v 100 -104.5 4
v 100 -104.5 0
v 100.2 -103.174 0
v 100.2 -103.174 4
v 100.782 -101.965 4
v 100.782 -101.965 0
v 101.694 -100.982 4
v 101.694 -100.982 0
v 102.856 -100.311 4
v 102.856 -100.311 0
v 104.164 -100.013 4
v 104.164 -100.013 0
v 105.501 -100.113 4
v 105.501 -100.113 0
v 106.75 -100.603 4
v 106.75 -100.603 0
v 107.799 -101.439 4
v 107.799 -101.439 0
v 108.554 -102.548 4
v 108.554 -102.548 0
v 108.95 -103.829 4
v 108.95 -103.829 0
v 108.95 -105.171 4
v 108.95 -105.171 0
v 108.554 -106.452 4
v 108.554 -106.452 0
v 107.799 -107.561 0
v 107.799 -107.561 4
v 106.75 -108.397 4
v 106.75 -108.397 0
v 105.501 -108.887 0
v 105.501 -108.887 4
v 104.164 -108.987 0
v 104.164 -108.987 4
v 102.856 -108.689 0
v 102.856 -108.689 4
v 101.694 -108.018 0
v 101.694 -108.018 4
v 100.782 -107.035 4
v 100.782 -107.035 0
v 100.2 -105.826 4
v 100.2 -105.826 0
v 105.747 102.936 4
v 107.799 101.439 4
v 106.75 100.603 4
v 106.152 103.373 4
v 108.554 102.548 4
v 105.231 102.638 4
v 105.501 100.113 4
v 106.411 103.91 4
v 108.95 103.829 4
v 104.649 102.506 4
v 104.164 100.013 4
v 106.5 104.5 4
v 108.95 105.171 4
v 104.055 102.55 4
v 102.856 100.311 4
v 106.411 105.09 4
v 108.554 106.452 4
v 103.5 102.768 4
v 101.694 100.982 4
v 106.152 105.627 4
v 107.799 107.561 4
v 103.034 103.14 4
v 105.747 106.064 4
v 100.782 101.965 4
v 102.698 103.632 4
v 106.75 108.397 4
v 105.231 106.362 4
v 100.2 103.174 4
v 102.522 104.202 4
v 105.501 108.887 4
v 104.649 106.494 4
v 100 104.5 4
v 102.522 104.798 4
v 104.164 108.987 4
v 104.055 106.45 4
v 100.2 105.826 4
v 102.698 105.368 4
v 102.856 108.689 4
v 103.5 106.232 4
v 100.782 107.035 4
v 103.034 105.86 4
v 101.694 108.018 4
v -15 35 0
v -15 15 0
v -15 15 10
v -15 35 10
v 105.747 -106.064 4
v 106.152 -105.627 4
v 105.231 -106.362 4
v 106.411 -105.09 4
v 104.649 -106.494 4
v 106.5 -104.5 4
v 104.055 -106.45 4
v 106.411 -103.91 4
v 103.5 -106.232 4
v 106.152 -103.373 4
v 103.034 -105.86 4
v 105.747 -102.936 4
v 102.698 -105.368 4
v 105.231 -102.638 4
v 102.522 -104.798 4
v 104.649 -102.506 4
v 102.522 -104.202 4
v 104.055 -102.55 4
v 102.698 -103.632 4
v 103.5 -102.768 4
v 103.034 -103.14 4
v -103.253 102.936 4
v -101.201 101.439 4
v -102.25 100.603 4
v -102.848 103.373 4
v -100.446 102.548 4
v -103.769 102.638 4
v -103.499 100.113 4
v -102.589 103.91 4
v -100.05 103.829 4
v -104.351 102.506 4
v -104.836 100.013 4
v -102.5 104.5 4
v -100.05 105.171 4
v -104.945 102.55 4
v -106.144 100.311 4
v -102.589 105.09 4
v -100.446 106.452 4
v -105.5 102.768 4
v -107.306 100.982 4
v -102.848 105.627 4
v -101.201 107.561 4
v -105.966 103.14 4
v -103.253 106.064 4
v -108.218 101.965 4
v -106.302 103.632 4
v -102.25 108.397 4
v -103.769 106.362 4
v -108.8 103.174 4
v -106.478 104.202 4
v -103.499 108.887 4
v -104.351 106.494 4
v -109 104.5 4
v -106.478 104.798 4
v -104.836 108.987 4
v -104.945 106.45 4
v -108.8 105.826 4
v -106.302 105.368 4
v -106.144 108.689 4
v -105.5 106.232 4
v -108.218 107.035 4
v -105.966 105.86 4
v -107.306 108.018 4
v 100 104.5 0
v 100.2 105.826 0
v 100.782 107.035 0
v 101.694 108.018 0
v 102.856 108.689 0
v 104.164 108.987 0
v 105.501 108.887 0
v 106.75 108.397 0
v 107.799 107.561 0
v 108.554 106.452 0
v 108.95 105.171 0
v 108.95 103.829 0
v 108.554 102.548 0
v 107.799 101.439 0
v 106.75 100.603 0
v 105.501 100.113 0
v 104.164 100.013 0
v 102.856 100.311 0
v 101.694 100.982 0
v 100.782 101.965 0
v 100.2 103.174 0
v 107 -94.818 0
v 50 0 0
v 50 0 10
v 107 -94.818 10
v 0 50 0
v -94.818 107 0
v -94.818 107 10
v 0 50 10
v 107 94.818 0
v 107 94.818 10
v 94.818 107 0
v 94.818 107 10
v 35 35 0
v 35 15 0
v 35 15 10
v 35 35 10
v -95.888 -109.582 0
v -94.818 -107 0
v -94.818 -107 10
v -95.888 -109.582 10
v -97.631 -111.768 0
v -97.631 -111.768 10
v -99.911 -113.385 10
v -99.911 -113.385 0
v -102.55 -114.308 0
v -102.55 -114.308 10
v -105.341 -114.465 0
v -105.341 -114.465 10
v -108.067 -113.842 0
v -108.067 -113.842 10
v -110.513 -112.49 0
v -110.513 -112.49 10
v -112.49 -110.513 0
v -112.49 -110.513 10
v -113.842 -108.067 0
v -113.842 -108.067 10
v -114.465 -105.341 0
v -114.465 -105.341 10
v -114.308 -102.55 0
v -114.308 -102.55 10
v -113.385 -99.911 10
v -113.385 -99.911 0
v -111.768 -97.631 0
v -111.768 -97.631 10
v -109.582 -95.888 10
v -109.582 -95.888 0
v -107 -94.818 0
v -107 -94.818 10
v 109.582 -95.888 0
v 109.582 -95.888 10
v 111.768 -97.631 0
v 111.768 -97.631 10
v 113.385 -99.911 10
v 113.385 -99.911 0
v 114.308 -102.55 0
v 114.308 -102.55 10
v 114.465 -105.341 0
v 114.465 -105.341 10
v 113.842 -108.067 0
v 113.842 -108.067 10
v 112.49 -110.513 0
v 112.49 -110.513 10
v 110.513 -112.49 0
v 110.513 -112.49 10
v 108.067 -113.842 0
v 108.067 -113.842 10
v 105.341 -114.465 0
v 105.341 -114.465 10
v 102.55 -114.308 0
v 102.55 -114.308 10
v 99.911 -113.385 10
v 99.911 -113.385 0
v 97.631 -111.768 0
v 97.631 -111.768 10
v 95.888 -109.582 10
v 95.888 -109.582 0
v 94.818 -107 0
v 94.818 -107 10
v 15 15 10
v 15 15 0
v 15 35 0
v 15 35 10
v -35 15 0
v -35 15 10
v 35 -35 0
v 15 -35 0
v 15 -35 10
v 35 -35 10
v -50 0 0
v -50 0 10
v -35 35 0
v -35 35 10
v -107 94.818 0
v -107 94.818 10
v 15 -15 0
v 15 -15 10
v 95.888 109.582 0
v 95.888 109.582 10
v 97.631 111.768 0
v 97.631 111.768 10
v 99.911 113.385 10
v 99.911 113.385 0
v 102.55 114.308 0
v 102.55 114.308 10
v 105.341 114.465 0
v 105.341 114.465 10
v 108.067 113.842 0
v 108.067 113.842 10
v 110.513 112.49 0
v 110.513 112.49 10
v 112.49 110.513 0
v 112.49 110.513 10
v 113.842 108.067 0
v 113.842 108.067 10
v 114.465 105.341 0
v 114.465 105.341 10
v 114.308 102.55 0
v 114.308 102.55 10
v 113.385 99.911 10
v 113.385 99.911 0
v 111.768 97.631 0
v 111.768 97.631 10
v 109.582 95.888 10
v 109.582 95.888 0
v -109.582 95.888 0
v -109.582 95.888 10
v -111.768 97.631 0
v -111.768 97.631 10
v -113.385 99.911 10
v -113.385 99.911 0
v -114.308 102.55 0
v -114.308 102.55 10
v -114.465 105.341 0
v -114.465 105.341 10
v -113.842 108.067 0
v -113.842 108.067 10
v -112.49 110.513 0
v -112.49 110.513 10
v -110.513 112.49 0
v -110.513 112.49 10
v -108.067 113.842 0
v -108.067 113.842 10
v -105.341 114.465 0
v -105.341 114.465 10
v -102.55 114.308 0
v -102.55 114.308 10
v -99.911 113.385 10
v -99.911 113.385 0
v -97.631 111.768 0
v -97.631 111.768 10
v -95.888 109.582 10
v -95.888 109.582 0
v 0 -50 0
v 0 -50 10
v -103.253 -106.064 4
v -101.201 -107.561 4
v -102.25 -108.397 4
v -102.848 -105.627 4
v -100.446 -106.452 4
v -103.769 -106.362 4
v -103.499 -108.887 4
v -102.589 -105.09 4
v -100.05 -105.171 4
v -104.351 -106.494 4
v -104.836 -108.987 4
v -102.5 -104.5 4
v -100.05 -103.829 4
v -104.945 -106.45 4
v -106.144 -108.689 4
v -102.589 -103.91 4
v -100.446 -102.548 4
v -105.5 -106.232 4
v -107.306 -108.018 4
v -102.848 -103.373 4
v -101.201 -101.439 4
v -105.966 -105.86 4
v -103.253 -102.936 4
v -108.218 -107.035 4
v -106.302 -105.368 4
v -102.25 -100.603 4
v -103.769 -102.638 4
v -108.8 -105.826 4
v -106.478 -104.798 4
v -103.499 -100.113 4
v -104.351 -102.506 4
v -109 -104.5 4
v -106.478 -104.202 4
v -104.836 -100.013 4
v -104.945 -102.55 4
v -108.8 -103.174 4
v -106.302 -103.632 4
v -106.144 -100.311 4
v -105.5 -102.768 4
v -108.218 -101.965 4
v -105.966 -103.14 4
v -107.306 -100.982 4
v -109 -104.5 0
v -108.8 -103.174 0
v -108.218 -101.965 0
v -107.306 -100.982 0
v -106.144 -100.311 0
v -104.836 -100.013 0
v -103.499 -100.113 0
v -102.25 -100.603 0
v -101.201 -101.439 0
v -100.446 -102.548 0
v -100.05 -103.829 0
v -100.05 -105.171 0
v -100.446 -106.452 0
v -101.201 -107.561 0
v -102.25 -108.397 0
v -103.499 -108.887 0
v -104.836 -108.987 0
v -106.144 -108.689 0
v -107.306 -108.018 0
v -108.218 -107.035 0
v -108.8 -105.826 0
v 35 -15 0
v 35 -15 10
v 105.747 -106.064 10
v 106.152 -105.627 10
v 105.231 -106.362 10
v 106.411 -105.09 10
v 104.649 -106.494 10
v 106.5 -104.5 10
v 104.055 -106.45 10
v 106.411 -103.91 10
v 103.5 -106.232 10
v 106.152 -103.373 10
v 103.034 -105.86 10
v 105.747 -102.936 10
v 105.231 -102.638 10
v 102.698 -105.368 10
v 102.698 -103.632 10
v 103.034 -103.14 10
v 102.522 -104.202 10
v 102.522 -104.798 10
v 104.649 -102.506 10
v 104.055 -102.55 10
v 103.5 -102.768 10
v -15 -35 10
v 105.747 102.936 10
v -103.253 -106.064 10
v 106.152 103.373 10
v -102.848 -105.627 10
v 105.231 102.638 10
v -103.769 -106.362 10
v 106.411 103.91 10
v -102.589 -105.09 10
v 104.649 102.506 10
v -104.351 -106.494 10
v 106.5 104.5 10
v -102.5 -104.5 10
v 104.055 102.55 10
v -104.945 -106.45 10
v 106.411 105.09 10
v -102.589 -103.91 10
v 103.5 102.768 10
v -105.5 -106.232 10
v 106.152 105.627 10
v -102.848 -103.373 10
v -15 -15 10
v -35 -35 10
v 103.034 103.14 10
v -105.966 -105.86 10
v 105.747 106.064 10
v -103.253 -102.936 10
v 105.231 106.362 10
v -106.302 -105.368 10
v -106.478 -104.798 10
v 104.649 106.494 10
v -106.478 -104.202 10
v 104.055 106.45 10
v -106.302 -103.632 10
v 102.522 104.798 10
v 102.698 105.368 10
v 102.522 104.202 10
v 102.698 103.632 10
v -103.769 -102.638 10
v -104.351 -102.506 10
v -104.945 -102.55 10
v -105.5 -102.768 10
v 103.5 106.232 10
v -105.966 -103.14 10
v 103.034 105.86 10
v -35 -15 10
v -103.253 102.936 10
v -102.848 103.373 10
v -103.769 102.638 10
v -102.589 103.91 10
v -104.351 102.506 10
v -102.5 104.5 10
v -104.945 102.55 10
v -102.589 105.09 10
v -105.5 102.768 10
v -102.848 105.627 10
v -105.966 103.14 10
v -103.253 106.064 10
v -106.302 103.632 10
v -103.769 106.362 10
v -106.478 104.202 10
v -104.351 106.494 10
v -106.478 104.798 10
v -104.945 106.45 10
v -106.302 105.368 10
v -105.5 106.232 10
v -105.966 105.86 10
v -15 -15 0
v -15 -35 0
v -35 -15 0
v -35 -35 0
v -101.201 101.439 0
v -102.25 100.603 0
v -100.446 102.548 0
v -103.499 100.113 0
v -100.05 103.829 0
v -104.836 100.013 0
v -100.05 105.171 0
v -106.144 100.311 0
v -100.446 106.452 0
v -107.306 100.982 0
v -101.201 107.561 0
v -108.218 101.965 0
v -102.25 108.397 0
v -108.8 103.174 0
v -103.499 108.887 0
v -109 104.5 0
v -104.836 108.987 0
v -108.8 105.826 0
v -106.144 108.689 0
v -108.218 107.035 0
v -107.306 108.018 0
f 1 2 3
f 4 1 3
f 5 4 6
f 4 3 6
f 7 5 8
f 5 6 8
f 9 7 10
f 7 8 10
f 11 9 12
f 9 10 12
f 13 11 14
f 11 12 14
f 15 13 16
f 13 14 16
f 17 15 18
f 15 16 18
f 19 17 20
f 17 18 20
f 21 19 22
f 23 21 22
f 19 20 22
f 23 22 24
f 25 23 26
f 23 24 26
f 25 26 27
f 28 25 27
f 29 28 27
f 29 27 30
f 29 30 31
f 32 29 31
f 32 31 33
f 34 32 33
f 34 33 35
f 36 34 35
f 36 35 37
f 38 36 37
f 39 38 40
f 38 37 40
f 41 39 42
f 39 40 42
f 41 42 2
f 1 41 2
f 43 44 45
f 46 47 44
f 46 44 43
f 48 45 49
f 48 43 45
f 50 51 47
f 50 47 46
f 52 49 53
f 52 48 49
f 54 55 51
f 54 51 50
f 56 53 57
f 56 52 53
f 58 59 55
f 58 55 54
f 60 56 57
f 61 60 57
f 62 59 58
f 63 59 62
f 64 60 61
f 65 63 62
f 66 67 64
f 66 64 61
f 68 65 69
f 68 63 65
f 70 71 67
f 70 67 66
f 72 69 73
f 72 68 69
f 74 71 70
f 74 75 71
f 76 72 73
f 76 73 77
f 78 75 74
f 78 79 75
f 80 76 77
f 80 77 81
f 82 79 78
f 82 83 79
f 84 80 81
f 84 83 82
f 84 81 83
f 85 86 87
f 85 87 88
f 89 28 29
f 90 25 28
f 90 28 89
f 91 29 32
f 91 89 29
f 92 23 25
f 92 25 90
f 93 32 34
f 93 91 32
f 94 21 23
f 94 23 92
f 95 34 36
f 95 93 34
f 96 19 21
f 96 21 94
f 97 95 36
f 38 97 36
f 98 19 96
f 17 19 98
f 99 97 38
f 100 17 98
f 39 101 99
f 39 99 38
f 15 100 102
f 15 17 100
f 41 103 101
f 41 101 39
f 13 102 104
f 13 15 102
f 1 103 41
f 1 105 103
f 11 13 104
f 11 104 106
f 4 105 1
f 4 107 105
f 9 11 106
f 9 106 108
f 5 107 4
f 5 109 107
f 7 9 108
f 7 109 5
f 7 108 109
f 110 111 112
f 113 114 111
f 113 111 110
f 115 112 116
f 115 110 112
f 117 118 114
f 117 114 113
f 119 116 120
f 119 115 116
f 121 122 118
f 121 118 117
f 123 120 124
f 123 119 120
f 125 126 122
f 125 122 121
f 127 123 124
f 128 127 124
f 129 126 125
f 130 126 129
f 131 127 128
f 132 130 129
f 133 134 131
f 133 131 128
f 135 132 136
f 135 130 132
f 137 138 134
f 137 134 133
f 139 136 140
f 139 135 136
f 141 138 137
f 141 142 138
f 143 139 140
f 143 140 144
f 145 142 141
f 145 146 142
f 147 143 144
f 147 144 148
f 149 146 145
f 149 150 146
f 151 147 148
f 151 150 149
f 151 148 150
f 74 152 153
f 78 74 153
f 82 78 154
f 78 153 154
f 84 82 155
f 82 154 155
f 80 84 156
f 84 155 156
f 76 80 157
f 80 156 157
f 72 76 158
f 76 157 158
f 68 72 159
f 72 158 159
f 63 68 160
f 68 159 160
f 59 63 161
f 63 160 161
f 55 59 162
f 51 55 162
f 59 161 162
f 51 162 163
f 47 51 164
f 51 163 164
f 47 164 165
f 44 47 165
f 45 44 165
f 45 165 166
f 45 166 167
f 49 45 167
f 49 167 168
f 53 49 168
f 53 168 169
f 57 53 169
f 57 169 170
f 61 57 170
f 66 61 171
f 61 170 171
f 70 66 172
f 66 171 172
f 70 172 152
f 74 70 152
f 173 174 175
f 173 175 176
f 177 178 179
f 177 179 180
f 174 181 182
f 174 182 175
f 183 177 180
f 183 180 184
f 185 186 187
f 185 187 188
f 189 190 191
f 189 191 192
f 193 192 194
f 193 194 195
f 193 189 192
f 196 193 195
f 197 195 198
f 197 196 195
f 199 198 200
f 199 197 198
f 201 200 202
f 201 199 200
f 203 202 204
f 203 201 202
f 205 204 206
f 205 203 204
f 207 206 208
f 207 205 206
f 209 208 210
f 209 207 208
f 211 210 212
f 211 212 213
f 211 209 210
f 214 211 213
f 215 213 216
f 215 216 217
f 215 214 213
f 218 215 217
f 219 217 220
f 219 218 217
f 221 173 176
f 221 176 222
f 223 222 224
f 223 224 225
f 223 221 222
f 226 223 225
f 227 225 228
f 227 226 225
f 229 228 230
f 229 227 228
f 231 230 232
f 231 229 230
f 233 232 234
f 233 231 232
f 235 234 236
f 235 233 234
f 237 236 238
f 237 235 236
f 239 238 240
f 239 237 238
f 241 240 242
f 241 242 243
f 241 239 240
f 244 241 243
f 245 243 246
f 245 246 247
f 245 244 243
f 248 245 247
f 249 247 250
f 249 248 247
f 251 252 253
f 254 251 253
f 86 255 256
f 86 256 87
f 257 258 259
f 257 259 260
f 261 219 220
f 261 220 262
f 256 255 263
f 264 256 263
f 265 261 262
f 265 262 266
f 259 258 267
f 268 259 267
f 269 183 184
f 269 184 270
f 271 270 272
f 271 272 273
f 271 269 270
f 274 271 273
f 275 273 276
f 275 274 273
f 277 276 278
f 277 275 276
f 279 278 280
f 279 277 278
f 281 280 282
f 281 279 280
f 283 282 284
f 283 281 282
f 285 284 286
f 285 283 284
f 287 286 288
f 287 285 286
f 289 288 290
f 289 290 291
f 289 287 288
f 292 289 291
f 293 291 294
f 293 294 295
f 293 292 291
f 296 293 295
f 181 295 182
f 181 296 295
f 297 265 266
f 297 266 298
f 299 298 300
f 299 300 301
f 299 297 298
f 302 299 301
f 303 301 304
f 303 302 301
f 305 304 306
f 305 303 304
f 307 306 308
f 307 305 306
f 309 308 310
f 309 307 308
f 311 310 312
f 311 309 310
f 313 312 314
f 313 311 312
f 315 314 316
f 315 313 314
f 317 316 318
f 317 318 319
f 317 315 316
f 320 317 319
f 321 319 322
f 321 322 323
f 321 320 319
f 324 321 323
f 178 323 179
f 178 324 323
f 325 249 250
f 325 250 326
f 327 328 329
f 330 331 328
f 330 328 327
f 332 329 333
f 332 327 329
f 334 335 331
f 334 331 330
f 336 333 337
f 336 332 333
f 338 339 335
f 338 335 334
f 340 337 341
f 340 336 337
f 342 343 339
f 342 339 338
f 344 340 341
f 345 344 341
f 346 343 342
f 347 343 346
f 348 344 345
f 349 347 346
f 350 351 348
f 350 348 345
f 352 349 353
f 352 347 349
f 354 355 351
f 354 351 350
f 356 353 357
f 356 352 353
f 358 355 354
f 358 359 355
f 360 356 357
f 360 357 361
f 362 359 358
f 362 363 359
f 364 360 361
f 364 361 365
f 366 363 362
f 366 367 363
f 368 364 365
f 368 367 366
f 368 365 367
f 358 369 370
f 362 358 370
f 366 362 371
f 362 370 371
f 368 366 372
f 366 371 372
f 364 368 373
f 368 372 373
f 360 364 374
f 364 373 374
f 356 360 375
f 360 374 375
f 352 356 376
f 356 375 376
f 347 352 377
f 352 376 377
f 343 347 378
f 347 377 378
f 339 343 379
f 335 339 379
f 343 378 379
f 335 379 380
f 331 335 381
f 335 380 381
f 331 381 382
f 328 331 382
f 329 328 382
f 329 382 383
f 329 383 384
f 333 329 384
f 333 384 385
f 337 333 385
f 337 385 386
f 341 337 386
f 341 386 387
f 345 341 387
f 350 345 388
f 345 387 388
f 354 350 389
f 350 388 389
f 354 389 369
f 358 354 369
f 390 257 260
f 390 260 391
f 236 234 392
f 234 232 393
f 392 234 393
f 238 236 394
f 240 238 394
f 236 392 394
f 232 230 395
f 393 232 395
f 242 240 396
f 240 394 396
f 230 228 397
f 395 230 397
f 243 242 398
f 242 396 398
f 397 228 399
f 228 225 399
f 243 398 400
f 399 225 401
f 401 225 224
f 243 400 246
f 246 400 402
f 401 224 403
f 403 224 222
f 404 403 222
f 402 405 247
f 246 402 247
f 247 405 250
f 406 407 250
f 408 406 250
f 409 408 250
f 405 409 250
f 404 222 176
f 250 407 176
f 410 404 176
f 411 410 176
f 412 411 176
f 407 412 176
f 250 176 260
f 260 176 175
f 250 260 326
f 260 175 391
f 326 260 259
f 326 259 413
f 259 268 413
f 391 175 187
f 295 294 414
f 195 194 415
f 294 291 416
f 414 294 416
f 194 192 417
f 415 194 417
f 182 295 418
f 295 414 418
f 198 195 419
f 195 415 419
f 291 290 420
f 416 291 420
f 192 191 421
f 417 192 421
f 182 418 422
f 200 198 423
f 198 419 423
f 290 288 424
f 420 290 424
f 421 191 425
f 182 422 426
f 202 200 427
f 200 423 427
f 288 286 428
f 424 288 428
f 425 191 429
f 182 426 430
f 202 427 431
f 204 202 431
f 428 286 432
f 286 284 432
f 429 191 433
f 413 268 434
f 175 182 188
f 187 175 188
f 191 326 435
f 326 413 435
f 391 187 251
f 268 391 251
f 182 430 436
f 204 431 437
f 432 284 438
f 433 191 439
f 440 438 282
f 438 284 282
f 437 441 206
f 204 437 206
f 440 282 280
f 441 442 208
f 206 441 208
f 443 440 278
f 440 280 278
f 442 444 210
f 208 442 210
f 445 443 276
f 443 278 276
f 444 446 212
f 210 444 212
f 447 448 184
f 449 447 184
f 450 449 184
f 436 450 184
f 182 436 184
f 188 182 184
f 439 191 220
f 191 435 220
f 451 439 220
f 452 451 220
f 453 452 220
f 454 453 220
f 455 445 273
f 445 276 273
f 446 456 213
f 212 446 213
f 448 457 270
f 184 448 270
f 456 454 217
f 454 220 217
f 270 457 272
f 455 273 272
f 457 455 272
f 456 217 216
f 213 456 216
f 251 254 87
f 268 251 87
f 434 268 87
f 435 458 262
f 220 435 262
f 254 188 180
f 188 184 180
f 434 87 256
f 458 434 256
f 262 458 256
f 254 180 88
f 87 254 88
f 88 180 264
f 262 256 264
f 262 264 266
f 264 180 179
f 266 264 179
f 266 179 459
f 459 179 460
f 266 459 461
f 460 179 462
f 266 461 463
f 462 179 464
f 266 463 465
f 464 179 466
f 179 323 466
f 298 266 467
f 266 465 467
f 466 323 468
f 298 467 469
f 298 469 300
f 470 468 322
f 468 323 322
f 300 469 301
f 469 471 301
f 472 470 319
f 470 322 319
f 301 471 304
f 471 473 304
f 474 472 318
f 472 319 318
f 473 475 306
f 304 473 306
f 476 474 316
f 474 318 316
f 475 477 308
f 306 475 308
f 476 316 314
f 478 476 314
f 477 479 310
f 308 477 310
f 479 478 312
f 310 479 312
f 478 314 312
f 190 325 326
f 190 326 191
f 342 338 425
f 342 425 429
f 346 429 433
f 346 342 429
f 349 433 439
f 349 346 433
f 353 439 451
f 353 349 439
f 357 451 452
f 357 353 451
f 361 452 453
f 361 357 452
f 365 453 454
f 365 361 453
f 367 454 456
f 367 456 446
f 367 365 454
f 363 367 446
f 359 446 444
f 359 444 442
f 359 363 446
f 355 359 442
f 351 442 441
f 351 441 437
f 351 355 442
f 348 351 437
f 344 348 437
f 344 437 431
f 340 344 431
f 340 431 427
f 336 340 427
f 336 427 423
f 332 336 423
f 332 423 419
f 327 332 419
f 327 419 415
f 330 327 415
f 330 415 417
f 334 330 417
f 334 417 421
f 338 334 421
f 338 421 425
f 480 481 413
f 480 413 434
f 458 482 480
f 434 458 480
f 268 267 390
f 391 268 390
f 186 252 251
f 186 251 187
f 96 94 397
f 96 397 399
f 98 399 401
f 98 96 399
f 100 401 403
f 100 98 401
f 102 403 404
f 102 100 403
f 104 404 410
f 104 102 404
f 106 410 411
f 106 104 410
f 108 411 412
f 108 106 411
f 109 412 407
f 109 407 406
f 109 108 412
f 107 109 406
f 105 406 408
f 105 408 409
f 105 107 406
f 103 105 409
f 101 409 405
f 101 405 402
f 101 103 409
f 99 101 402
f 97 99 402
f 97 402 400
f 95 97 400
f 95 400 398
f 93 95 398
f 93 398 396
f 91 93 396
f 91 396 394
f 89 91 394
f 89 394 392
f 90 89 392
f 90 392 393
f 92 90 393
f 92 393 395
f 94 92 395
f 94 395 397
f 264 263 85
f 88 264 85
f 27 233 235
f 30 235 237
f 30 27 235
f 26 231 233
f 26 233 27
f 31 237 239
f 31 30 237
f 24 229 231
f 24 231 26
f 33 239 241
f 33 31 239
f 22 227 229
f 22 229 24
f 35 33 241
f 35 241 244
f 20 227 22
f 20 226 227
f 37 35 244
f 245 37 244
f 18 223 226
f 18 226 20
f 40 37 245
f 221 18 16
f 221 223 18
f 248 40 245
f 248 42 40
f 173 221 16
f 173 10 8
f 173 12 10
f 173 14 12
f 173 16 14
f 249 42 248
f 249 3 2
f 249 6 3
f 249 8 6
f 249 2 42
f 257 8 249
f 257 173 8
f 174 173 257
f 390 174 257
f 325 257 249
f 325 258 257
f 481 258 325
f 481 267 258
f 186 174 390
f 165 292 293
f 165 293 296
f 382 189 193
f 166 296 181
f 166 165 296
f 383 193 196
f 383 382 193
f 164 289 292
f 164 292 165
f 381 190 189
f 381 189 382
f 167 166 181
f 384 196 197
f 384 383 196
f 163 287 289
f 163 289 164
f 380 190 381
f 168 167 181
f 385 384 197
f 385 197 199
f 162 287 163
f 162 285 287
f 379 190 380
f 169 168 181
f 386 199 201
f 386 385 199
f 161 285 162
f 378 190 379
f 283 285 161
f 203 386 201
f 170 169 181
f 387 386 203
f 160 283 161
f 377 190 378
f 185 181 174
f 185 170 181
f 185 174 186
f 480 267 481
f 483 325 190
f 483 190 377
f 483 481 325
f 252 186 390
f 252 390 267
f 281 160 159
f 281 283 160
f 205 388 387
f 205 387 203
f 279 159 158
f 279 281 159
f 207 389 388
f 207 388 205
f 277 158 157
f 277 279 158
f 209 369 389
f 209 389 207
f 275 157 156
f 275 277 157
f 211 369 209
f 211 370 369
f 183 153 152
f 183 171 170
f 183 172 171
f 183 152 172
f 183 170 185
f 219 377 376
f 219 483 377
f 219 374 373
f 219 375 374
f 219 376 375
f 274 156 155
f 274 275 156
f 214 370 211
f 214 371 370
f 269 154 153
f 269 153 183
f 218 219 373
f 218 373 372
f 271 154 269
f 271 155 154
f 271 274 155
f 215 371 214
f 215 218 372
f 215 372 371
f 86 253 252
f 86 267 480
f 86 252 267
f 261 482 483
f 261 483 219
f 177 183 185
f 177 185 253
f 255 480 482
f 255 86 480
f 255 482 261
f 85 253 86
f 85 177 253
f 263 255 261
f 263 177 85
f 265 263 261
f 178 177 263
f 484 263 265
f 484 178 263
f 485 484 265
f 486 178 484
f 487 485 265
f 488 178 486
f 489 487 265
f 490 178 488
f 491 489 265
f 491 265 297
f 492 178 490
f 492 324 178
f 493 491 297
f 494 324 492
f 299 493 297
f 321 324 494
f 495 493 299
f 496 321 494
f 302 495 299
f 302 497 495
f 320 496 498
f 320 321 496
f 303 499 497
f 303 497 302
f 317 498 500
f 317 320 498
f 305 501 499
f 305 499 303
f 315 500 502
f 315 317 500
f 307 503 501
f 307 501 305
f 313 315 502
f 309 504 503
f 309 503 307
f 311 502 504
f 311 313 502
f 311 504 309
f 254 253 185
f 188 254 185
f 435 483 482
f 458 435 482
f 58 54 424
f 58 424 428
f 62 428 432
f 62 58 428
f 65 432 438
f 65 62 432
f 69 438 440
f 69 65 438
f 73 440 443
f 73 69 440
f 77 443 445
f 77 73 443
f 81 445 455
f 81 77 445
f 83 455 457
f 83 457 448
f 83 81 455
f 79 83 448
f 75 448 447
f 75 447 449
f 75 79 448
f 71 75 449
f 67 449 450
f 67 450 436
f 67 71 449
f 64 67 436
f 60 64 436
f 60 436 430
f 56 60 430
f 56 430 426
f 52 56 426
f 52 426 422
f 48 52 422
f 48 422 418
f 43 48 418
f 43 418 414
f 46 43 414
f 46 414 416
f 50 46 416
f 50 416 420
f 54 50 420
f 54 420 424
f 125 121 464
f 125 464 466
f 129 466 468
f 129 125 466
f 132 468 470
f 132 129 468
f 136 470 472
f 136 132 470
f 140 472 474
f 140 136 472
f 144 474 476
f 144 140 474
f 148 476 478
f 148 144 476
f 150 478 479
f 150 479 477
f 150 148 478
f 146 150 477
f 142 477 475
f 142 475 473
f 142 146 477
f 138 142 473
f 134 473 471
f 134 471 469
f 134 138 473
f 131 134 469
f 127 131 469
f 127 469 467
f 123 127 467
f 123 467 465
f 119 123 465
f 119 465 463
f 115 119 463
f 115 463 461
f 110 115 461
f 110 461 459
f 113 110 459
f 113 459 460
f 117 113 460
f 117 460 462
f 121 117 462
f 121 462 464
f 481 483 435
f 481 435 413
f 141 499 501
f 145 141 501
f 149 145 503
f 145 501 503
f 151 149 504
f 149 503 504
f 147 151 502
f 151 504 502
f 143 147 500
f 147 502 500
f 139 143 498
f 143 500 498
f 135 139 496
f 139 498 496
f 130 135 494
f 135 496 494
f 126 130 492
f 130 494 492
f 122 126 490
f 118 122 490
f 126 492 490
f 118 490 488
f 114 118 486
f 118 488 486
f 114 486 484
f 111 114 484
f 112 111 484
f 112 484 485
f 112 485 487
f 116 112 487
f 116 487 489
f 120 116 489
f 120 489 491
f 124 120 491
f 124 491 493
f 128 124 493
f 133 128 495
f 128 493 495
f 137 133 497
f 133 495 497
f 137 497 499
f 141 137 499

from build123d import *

# Parameters (mm, degrees)
ESBO_O1_R                = 2
ESBO_O1_W                = 20
ESBO_O1_H                = 20
RESSALTO_EXTRUS_O1_DEPTH = 10
ESBO_O3_R                = 4.5
CORTE_EXTRUS_O1_DEPTH    = 4


with BuildPart() as part:
    # Esboço1 → Ressalto-extrusão1 (new body)
    with BuildSketch(Plane.XY):
        with BuildLine():
            Line((107, 94.817541634), (50, 0))
            Line((50, 0), (107, -94.817541634))
            ThreePointArc((107, -94.817541634), (111.571067812, -111.571067812), (94.817541634, -107))
            Line((94.817541634, -107), (0, -50))
            Line((0, -50), (-94.817541634, -107))
            ThreePointArc((-94.817541634, -107), (-111.571067812, -111.571067812), (-107, -94.817541634))
            Line((-107, -94.817541634), (-50, 0))
            Line((-50, 0), (-107, 94.817541634))
            ThreePointArc((-107, 94.817541634), (-111.571067812, 111.571067812), (-94.817541634, 107))
            Line((-94.817541634, 107), (0, 50))
            Line((0, 50), (94.817541634, 107))
            ThreePointArc((94.817541634, 107), (111.571067812, 111.571067812), (107, 94.817541634))
        make_face()
        with Locations((-104.5, 104.5)):
            Circle(ESBO_O1_R, mode=Mode.SUBTRACT)
        with Locations((104.5, 104.5)):
            Circle(ESBO_O1_R, mode=Mode.SUBTRACT)
        with Locations((104.5, -104.5)):
            Circle(ESBO_O1_R, mode=Mode.SUBTRACT)
        with Locations((-104.5, -104.5)):
            Circle(ESBO_O1_R, mode=Mode.SUBTRACT)
        with Locations((25, -25)):
            Rectangle(ESBO_O1_W, ESBO_O1_H, mode=Mode.SUBTRACT)
        with Locations((25, 25)):
            Rectangle(ESBO_O1_W, ESBO_O1_H, mode=Mode.SUBTRACT)
        with Locations((-25, 25)):
            Rectangle(ESBO_O1_W, ESBO_O1_H, mode=Mode.SUBTRACT)
        with Locations((-25, -25)):
            Rectangle(ESBO_O1_W, ESBO_O1_H, mode=Mode.SUBTRACT)
    extrude(amount=RESSALTO_EXTRUS_O1_DEPTH)

    # Esboço3 → Corte-extrusão1 (cut)
    with BuildSketch(Plane(origin=(0, 0, 0), x_dir=(-1, 0, 0), z_dir=(0, 0, -1))):
        with Locations((-104.5, 104.5)):
            Circle(ESBO_O3_R)
        with Locations((104.5, 104.5)):
            Circle(ESBO_O3_R)
        with Locations((104.5, -104.5)):
            Circle(ESBO_O3_R)
        with Locations((-104.5, -104.5)):
            Circle(ESBO_O3_R)
    extrude(amount=-CORTE_EXTRUS_O1_DEPTH, mode=Mode.SUBTRACT)


solid = part.part
